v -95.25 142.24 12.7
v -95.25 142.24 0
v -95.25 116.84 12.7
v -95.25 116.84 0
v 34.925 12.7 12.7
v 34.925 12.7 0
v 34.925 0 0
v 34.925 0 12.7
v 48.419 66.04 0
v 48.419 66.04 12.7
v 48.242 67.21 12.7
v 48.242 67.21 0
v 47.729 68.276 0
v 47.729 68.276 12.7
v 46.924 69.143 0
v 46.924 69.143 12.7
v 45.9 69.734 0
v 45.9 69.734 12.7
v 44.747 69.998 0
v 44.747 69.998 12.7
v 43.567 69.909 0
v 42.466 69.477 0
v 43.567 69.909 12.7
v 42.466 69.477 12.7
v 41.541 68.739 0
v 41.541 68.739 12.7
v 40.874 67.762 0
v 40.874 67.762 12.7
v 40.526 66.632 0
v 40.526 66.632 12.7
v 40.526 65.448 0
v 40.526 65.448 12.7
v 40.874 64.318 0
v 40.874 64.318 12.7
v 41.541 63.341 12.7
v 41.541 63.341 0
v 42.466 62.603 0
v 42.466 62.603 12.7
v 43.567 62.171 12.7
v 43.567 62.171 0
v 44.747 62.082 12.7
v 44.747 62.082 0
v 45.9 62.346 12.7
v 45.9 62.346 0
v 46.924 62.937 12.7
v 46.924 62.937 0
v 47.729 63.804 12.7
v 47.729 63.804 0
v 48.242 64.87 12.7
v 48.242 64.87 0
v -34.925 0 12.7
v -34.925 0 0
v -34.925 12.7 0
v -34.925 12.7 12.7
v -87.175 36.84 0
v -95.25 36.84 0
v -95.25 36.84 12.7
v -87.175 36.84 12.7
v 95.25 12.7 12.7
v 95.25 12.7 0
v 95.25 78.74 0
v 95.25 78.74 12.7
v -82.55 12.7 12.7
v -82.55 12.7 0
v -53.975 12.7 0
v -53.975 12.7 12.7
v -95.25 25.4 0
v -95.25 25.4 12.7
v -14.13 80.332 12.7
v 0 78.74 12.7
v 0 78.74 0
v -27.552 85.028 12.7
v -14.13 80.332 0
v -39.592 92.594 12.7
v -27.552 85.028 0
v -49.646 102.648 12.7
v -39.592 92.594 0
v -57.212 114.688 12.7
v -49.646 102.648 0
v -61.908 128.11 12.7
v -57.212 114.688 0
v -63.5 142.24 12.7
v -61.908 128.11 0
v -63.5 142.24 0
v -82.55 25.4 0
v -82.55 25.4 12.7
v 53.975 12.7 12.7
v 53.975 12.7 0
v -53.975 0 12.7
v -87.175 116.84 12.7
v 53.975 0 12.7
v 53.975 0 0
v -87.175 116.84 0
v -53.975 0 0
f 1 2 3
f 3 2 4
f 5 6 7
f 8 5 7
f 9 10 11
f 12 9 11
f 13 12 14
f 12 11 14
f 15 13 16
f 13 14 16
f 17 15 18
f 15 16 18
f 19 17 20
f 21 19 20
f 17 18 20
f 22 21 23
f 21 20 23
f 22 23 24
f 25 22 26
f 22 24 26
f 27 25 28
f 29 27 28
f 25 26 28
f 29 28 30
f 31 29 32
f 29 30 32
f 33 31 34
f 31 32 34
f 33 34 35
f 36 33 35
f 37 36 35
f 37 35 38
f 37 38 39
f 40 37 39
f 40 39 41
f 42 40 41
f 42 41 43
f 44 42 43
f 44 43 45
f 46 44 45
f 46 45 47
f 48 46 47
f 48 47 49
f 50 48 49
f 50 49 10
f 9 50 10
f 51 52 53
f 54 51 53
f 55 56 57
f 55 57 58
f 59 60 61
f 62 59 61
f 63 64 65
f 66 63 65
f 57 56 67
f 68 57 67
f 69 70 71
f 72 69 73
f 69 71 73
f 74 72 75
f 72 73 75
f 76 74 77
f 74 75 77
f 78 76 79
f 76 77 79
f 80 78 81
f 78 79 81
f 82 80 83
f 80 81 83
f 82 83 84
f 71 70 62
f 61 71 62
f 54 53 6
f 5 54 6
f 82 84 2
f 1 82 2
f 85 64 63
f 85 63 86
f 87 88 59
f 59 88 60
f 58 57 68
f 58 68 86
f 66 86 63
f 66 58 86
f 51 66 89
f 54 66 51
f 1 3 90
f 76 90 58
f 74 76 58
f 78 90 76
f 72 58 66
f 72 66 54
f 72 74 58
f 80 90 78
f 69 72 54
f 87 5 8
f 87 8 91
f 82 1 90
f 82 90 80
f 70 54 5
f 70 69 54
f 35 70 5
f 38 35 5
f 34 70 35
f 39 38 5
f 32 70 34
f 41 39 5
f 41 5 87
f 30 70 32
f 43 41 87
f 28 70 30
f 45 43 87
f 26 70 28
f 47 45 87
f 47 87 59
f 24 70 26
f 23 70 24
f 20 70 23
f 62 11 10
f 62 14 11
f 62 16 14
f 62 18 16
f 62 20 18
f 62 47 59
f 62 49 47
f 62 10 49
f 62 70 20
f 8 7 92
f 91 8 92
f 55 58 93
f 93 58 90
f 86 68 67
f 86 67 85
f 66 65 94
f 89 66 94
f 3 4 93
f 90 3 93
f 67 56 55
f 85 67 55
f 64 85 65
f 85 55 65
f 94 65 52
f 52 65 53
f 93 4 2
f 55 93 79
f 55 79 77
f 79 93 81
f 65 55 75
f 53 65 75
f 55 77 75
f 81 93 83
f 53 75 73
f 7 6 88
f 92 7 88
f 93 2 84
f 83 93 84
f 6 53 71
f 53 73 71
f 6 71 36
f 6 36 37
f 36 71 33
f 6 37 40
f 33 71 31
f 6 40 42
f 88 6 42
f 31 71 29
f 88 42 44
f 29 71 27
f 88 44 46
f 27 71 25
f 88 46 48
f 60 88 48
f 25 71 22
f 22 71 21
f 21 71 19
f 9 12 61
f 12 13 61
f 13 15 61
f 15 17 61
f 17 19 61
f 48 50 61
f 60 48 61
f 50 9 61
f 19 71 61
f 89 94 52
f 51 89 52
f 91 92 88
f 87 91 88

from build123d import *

# Parameters (mm, degrees)
EXTRUDE1_DEPTH        = 12.7
SKETCH2_R             = 3.96875
CUT_EXTRUDE1_DEPTH    = 172.656838198
SKETCH3_W             = 12.7
SKETCH3_H             = 12.7
EXTRUDE2_DEPTH        = 172.656838198
SKETCH4_W             = 105.983052191
SKETCH4_H             = 75.202262717
EXTRUDE3_DEPTH        = 172.656838198
CROQUIS1_W            = 8.075015689
CROQUIS1_H            = 80
CORTAR_EXTRUIR1_DEPTH = 12.7


with BuildPart() as part:
    # Sketch1 → Extrude1 (new body)
    with BuildSketch(Plane.XY):
        with BuildLine():
            Line((-95.25, 12.7), (-53.975, 12.7))
            Line((-53.975, 12.7), (-53.975, 0))
            Line((-53.975, 0), (-34.925, 0))
            Line((-34.925, 0), (-34.925, 12.7))
            Line((-34.925, 12.7), (34.925, 12.7))
            Line((34.925, 12.7), (34.925, 0))
            Line((34.925, 0), (53.975, 0))
            Line((53.975, 0), (53.975, 12.7))
            Line((53.975, 12.7), (95.25, 12.7))
            Line((95.25, 12.7), (95.25, 142.24))
            Line((95.25, 142.24), (63.5, 142.24))
            ThreePointArc((63.5, 142.24), (0, 78.74), (-63.5, 142.24))
            Line((-63.5, 142.24), (-95.25, 142.24))
            Line((-95.25, 142.24), (-95.25, 12.7))
        make_face()
    extrude(amount=EXTRUDE1_DEPTH)

    # Sketch2 → Cut-Extrude1 (cut, through all)
    with BuildSketch(Plane.XY.offset(12.7)):
        with Locations((44.45, 66.04)):
            Circle(SKETCH2_R)
    extrude(amount=-CUT_EXTRUDE1_DEPTH, mode=Mode.SUBTRACT)

    # Sketch3 → Extrude2 (cut, through all)
    with BuildSketch(Plane.XY.offset(12.7)):
        with Locations((-88.9, 19.05)):
            Rectangle(SKETCH3_W, SKETCH3_H)
    extrude(amount=-EXTRUDE2_DEPTH, mode=Mode.SUBTRACT)

    # Sketch4 → Extrude3 (cut, through all)
    with BuildSketch(Plane.XY.offset(12.7)):
        with Locations((52.991526096, 116.341131359)):
            Rectangle(SKETCH4_W, SKETCH4_H)
    extrude(amount=-EXTRUDE3_DEPTH, mode=Mode.SUBTRACT)

    # Croquis1 → Cortar-Extruir1 (cut)
    with BuildSketch(Plane.XY.offset(12.7)):
        with Locations((-91.212492156, 76.84)):
            Rectangle(CROQUIS1_W, CROQUIS1_H)
    extrude(amount=-CORTAR_EXTRUIR1_DEPTH, mode=Mode.SUBTRACT)


solid = part.part
